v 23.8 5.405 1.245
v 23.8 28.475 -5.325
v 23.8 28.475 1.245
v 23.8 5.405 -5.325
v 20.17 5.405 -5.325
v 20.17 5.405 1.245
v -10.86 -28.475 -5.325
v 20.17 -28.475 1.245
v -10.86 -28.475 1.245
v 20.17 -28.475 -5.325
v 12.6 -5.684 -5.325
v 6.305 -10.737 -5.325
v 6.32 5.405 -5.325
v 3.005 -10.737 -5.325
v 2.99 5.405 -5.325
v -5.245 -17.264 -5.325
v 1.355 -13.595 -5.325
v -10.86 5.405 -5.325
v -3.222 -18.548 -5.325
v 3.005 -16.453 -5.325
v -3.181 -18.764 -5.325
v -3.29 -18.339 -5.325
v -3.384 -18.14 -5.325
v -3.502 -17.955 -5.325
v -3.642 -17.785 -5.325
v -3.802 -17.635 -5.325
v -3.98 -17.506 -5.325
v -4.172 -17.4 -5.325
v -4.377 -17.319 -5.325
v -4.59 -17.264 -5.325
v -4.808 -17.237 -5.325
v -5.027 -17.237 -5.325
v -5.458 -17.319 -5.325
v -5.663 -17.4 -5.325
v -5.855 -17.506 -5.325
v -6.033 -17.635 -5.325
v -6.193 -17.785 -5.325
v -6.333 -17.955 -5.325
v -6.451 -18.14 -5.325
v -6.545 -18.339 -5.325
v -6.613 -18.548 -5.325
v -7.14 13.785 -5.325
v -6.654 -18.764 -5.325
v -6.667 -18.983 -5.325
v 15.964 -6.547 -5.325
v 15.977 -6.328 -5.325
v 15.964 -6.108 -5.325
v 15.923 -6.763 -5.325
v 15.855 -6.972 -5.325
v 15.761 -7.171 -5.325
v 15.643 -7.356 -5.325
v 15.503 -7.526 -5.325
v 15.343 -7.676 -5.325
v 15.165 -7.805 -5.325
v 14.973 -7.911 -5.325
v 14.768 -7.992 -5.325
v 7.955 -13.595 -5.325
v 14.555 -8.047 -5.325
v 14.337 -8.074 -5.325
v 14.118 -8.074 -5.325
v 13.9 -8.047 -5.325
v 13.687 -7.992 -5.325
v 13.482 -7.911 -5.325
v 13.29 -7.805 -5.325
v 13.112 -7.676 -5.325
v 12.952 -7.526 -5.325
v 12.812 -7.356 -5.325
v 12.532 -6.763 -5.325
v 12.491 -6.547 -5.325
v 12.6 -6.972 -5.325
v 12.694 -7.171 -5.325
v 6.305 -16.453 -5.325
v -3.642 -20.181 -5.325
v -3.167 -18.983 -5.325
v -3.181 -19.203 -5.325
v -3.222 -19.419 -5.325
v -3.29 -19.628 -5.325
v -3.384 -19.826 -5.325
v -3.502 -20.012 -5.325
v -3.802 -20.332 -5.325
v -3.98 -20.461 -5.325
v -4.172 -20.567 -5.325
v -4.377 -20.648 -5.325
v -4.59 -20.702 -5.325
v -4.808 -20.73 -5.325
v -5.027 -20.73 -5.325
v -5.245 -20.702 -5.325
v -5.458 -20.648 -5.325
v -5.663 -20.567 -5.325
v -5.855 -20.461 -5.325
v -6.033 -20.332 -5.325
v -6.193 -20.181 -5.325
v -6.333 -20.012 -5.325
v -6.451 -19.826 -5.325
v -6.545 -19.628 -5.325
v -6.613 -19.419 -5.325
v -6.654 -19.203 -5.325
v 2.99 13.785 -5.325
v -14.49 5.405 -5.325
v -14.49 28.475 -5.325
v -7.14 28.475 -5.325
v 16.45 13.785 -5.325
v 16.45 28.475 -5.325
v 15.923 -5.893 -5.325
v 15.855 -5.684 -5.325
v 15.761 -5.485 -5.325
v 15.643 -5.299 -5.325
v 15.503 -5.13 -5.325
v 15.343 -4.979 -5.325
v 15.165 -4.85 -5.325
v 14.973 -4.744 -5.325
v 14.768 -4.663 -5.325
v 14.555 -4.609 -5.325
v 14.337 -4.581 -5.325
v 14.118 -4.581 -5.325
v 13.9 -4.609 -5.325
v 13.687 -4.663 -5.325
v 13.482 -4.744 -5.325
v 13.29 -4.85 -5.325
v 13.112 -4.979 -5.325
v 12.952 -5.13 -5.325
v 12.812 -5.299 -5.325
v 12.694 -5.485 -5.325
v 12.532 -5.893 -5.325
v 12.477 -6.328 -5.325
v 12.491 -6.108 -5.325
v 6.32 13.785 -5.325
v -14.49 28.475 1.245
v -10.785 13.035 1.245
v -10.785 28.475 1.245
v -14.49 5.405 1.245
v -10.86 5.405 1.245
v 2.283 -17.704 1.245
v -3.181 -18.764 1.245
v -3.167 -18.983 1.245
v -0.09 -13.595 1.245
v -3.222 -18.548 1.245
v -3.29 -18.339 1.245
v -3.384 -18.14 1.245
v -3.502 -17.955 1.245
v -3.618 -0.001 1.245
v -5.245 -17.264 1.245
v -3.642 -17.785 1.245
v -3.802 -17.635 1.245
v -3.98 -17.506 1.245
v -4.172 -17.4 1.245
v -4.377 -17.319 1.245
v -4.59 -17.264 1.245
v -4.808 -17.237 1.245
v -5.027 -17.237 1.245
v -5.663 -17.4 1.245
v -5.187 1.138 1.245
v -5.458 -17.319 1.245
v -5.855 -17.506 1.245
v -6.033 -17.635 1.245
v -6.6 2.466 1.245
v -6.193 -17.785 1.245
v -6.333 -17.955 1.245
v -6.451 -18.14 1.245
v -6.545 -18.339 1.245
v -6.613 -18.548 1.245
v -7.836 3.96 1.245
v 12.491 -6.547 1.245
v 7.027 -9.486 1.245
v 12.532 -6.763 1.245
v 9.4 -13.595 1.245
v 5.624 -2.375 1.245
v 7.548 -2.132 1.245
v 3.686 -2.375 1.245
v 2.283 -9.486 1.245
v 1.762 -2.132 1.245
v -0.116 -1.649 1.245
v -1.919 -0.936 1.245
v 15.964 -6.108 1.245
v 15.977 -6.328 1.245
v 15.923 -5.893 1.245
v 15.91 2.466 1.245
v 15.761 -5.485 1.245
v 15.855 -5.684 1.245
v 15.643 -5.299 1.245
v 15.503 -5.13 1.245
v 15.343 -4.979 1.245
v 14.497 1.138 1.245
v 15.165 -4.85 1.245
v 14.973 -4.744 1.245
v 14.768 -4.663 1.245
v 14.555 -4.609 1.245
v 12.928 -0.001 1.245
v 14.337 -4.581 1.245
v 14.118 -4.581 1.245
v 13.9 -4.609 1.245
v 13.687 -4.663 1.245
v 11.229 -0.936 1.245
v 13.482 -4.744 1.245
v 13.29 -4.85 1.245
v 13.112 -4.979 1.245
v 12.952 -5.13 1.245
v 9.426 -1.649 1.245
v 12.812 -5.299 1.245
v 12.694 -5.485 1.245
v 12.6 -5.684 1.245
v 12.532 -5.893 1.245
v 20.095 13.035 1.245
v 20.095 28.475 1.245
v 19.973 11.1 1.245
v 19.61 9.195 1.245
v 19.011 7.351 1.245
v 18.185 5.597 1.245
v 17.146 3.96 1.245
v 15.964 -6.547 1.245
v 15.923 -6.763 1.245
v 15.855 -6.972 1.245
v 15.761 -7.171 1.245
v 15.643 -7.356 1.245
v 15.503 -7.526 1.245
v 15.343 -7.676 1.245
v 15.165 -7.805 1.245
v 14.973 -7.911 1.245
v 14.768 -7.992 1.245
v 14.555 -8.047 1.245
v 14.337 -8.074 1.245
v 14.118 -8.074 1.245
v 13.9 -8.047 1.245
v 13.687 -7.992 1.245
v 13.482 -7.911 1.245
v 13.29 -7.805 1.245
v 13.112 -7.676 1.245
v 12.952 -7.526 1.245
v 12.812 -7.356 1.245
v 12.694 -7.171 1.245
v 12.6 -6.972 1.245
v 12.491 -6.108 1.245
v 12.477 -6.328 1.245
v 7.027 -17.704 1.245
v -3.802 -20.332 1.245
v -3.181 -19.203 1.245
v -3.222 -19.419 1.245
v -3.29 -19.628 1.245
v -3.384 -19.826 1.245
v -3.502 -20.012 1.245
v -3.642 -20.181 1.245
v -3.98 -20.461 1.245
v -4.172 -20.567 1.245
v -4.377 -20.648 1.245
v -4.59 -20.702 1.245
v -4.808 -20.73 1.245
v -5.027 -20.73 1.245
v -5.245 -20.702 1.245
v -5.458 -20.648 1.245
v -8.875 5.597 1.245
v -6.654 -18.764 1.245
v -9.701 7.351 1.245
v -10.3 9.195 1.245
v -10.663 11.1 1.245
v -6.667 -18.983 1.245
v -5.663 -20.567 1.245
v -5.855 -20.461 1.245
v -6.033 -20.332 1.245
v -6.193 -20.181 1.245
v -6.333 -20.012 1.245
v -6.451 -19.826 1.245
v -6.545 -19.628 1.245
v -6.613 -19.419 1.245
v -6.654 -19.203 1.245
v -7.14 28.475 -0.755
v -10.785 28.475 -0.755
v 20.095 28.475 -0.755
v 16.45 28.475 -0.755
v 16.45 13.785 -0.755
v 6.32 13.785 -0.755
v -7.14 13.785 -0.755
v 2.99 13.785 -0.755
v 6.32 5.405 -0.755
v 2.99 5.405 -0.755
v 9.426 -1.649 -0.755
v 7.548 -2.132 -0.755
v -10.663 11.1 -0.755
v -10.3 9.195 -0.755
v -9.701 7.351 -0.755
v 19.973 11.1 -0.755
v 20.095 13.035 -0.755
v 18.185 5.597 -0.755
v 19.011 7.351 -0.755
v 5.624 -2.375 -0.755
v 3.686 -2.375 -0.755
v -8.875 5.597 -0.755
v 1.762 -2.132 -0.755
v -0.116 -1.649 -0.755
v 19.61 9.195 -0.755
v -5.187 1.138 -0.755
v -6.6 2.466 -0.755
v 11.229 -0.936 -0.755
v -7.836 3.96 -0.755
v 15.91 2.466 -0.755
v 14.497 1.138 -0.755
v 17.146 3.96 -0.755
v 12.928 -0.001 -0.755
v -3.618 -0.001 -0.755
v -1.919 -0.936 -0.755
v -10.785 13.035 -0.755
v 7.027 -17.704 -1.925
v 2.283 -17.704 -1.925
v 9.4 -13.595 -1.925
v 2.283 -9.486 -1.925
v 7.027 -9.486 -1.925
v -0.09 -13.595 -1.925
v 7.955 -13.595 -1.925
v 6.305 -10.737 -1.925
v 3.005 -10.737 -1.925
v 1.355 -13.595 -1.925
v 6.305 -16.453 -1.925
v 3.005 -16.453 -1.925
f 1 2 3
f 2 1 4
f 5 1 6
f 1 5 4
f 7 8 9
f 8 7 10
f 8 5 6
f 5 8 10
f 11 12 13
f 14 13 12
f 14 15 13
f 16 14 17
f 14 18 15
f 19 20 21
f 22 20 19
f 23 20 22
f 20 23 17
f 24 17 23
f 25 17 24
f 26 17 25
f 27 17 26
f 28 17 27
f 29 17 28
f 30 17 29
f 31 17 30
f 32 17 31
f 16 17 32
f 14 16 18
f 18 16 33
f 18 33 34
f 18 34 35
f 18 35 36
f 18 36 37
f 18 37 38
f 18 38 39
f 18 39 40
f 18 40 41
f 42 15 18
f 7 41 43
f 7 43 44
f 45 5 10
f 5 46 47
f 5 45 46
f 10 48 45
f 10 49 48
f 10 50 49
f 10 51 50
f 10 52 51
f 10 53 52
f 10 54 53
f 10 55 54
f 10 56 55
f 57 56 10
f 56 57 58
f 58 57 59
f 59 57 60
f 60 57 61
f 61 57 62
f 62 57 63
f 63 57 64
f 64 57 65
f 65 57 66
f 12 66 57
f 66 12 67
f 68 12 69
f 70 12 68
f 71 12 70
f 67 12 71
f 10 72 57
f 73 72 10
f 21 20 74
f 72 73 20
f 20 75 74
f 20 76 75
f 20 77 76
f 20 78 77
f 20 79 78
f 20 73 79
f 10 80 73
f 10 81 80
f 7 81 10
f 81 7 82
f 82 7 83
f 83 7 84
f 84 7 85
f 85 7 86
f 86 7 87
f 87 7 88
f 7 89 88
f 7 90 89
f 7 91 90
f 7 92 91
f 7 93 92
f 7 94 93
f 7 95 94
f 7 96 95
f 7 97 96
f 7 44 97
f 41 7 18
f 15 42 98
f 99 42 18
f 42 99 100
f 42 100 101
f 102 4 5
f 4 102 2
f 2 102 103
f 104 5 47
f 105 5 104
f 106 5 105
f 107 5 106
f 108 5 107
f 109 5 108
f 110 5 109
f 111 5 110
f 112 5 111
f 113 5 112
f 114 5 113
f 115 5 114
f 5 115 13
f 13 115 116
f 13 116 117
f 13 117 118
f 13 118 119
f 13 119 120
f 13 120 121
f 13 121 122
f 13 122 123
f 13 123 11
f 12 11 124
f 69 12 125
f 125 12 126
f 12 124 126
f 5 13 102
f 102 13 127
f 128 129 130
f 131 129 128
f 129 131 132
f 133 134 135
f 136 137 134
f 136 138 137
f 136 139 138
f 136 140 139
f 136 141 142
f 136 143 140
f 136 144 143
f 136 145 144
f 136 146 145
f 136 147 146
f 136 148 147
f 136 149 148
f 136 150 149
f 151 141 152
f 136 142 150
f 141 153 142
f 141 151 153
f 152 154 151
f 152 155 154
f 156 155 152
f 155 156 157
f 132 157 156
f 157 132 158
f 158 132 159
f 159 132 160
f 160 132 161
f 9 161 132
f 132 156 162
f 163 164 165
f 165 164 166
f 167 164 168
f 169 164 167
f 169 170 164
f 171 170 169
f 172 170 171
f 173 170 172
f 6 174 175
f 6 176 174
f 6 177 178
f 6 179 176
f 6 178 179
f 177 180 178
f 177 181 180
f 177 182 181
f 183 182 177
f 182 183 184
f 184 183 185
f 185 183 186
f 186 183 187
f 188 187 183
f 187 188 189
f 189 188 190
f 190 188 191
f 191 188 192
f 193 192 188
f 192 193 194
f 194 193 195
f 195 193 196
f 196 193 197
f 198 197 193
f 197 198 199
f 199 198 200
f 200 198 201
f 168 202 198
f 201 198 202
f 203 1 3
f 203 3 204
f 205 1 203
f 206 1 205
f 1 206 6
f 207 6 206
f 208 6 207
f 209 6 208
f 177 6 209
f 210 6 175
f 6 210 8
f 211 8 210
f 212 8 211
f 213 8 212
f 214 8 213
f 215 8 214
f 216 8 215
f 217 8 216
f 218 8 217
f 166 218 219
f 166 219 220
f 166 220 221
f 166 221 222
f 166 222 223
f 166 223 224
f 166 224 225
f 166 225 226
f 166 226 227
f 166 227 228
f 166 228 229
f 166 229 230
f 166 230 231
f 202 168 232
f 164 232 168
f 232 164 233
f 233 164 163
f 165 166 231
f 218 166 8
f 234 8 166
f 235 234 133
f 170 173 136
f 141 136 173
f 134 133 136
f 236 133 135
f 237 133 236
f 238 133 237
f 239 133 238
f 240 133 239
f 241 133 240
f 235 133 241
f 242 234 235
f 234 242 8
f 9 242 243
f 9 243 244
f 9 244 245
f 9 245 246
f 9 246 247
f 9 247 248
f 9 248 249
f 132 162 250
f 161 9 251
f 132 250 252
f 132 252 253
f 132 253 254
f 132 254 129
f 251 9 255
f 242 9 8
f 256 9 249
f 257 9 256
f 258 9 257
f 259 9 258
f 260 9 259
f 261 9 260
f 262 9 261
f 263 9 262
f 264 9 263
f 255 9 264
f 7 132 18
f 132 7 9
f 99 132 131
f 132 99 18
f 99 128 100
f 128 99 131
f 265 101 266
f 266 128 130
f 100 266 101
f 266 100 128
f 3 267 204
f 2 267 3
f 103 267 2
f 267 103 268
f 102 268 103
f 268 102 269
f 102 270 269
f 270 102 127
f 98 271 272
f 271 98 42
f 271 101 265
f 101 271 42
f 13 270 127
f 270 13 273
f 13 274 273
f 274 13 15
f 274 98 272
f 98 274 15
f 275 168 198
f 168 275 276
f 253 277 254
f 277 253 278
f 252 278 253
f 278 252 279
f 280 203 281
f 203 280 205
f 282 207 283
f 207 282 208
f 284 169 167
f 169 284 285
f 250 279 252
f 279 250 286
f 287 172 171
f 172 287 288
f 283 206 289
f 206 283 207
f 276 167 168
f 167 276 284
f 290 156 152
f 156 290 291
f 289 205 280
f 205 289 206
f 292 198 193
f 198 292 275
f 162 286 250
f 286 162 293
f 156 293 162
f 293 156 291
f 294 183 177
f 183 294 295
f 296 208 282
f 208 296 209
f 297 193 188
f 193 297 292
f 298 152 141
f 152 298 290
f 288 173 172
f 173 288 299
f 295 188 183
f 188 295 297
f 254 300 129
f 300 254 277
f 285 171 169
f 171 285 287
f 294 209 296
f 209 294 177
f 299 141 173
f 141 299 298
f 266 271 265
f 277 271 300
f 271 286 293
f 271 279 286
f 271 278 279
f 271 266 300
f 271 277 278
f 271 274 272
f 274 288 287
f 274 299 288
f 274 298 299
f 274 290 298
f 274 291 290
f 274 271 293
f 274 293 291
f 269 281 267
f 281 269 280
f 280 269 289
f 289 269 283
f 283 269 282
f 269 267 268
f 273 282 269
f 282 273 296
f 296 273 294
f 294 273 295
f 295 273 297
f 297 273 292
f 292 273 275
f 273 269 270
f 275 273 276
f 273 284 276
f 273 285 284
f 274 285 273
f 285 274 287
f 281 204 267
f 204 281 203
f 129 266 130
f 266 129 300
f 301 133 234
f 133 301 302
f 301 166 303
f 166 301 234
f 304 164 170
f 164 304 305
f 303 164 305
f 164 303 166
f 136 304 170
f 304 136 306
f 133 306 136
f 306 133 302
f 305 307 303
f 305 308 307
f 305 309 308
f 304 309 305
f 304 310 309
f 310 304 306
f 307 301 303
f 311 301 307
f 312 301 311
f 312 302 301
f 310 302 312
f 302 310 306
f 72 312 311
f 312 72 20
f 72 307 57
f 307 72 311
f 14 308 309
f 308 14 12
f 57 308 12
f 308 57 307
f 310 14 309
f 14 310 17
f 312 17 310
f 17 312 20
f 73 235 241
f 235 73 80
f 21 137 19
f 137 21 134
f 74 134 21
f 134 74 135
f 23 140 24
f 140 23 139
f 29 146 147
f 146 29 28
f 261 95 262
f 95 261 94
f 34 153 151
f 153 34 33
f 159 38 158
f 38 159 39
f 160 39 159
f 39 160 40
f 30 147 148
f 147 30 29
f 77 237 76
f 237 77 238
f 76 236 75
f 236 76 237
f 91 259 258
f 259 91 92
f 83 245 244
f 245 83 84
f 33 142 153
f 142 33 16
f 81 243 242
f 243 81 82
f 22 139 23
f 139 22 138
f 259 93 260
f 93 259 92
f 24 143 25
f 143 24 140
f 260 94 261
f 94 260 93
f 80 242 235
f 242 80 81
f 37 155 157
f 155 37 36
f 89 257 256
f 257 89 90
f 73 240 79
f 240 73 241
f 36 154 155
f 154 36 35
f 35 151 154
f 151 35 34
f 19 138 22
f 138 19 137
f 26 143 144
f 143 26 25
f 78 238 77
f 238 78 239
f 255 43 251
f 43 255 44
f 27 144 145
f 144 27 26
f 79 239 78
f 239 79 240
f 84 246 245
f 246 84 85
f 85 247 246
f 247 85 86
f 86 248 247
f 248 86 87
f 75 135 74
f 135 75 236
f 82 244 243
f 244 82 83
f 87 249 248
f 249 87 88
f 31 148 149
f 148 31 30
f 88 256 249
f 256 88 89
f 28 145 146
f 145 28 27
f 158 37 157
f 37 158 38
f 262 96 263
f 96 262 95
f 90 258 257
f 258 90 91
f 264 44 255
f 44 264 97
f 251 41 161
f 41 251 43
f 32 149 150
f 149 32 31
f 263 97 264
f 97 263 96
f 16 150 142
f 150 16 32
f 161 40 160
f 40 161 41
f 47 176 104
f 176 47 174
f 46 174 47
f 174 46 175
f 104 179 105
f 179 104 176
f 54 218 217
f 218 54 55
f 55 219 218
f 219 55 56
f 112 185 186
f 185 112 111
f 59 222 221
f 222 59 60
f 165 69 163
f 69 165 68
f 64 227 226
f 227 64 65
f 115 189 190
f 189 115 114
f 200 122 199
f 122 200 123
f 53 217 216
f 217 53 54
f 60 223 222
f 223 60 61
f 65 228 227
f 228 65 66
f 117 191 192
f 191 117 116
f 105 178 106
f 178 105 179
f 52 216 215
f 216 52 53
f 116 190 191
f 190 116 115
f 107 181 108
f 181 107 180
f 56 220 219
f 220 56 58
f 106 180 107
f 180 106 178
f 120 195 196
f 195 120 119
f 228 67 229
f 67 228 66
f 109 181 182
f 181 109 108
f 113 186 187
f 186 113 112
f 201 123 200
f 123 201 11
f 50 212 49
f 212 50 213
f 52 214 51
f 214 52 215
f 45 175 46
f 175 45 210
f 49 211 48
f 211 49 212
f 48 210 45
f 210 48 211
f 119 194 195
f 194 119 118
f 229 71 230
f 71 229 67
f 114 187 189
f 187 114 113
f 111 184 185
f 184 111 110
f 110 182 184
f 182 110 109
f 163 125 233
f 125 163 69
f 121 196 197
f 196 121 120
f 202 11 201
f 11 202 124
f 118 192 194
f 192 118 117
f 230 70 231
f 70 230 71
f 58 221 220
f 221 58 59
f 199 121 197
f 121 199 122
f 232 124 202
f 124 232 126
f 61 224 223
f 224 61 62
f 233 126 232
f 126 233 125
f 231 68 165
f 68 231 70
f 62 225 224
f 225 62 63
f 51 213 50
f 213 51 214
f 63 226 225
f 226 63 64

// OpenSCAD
$fn=50;


height=59.35 - 2.4;
width=47.60;
thickness=10.65;

topWidth=38.29;
topHeight=23.70;
bottomWidth=31.10;
bottomHeight=height-topHeight;
thickness3=6.57;



diameter=28.88;



circleThickness=2;
radius=diameter/2 + 1;

smallRecHeight=8.38;
smallRecWidth=3.33;
cuttingWidth=23.59;
cuttingHeight=14.69;
extraHeight = (height - (smallRecHeight + cuttingHeight));
extraWidth = 3.63;

bigCircleDiameter=27.33;
topHalfHeight=29.63;
remaindingHeight=height-topHalfHeight;

hex_nut_diameter=7.89 + 1.6; // +1.6, 
hex_nut_radius=hex_nut_diameter/2;
hex_nut_thickness=3.85;

hex_nut_inner_diameter= 5.8;//5;
hex_nut_inner_radius=hex_nut_inner_diameter/2 + .4;



temp=(thickness/2) - (thickness - thickness3);
offsetFromCenter=19; //19.25; //1.5 // 2.3
hexNutGroveExtraDepth=2;

screwRadius=1.75;
screwDepth=9.35;

module part1(){
translate([(width/2) - (topWidth/2) ,(thickness/2) - (thickness3)/2,0]) color("blue") difference(){    
    difference(){
cube([topWidth, thickness3, height], center=true);  

union(){
color("blue") translate([topWidth/2 - (extraWidth/2),0,-extraHeight/2 + ( (height/2) - (smallRecHeight + cuttingHeight) )]) cube([extraWidth,thickness3 ,extraHeight],center=true);

color("blue") translate([ -(topWidth/2 - (extraWidth/2)),0,-extraHeight/2 + ( (height/2) - (smallRecHeight + cuttingHeight) )]) cube([extraWidth,thickness3 ,extraHeight],center=true);
}


//translate([0,0,extraHeight - (height/2) - offsetFromCenter]) union(){
//    //-(remaindingHeight/2) + (hex_nut_radius)
//translate([0,5,0]) color("black") rotate([90,0,0]) cylinder(h=hex_nut_thickness/2 + hexNutGroveExtraDepth + 1.3, r=hex_nut_radius,center=true, $fn = 6); //h=thickness3
////-(remaindingHeight/2) + (hex_nut_inner_radius + (hex_nut_radius - hex_nut_inner_radius))
//translate([0, 0,0]) color("red") rotate([90,0,0]) cylinder(h=hex_nut_thickness/2 + 10, r=hex_nut_inner_radius,center=true, $fn = 6);
//}


}
union(){
    translate([0,-((-(thickness3/2)+(thickness3-circleThickness)/2)),(height/2) - (smallRecHeight + cuttingHeight) ]) union(){
translate([0,0,(cuttingHeight/2) + (smallRecHeight)]) cube([cuttingWidth,thickness3 - circleThickness +.1, cuttingHeight],center=true);
                 translate([0,0,smallRecHeight/2]) cube([smallRecWidth,thickness3 - circleThickness+.1,smallRecHeight],center=true);            
}


translate([0,-(thickness3/2 - (circleThickness/2)),(height/2) - (radius)]) color("red")rotate([90,0,0])union(){
        cylinder(h=circleThickness, r=radius, center=true);
        translate([0,radius/2,0])cube([radius*2,radius,circleThickness],center=true);
    }
    
    }

}
}


module part2(){
//translate([0,temp,0]) 
difference(){
cube([width,thickness,height],center=true);
//translate([0,(thickness/2) - (thickness - thickness3)/2,0]) color("blue") cube([topWidth,thickness - thickness3,height],center=true);
//
translate([(width/2) - (topWidth/2),(thickness/2) - (thickness3)/2,0]) color("blue") union(){
cube([topWidth, thickness3, height], center=true);   
union(){
color("red") translate([topWidth/2 - (extraWidth/2),0,-extraHeight/2 + ( (height/2) - (smallRecHeight + cuttingHeight) )]) cube([extraWidth,thickness3+10 ,extraHeight],center=true);

color("red") translate([ -(topWidth/2 - (extraWidth/2)),0,-extraHeight/2 + ( (height/2) - (smallRecHeight + cuttingHeight) )]) cube([extraWidth,thickness3+10,extraHeight],center=true);
}


//translate([0,0, extraHeight - (height/2)  - offsetFromCenter]) union(){
//    
//translate([0, -temp - (hex_nut_thickness/2) - .8,0]) color("red") rotate([90,0,0]) cylinder(h=hex_nut_thickness/2 + hexNutGroveExtraDepth, r=hex_nut_radius,center=true, $fn = 6);
//
//translate([0, -temp - (hex_nut_thickness/2),0]) color("red") rotate([90,0,0]) cylinder(h=hex_nut_thickness/2 + 7, r=hex_nut_inner_radius,center=true, $fn = 6);
//}


}
}

}

module glueScrews(){
translate([0,0.1,0]) union(){
rotate([90,0,0]) translate([(width/2) - (topWidth/2) - (topWidth/4),-(height/3),-(thickness-screwDepth)/2]) cylinder(h=screwDepth,r=screwRadius,center=true);

rotate([90,0,0]) translate([(width/2) - (topWidth/2) + (topWidth/4),-(height/9),-(thickness-screwDepth)/2]) cylinder(h=screwDepth,r=screwRadius,center=true);
}
}


module modifiedParts(part=1){


difference(){
    
        if(part == 1){
            part1();
        }else if(part == 2){
            part2();
        }
//        part2();    

translate([(width/2) - (topWidth/2),0,extraHeight - (height/2) - offsetFromCenter]) union(){
    //-(remaindingHeight/2) + (hex_nut_radius)
    
    //((hex_nut_thickness/2 + 10)/2)-(hex_nut_thickness/2 + hexNutGroveExtraDepth + 1.3)/2
translate([0,0,0]) color("black") rotate([90,0,0]) cylinder(h=hex_nut_thickness, r=hex_nut_radius,center=true, $fn = 6); //h=thickness3
//-(remaindingHeight/2) + (hex_nut_inner_radius + (hex_nut_radius - hex_nut_inner_radius))
translate([0, 0,0]) color("red") rotate([90,0,0]) cylinder(h=hex_nut_thickness+ 20, r=hex_nut_inner_radius,center=true, $fn = 6);
    
//    glueScrews();
}

}
}


rotate([-90,0,0]) difference(){
modifiedParts(1);
   glueScrews(); 
}

//rotate([90,0,0]) difference(){
//
//modifiedParts(2);
//    glueScrews();
//}
